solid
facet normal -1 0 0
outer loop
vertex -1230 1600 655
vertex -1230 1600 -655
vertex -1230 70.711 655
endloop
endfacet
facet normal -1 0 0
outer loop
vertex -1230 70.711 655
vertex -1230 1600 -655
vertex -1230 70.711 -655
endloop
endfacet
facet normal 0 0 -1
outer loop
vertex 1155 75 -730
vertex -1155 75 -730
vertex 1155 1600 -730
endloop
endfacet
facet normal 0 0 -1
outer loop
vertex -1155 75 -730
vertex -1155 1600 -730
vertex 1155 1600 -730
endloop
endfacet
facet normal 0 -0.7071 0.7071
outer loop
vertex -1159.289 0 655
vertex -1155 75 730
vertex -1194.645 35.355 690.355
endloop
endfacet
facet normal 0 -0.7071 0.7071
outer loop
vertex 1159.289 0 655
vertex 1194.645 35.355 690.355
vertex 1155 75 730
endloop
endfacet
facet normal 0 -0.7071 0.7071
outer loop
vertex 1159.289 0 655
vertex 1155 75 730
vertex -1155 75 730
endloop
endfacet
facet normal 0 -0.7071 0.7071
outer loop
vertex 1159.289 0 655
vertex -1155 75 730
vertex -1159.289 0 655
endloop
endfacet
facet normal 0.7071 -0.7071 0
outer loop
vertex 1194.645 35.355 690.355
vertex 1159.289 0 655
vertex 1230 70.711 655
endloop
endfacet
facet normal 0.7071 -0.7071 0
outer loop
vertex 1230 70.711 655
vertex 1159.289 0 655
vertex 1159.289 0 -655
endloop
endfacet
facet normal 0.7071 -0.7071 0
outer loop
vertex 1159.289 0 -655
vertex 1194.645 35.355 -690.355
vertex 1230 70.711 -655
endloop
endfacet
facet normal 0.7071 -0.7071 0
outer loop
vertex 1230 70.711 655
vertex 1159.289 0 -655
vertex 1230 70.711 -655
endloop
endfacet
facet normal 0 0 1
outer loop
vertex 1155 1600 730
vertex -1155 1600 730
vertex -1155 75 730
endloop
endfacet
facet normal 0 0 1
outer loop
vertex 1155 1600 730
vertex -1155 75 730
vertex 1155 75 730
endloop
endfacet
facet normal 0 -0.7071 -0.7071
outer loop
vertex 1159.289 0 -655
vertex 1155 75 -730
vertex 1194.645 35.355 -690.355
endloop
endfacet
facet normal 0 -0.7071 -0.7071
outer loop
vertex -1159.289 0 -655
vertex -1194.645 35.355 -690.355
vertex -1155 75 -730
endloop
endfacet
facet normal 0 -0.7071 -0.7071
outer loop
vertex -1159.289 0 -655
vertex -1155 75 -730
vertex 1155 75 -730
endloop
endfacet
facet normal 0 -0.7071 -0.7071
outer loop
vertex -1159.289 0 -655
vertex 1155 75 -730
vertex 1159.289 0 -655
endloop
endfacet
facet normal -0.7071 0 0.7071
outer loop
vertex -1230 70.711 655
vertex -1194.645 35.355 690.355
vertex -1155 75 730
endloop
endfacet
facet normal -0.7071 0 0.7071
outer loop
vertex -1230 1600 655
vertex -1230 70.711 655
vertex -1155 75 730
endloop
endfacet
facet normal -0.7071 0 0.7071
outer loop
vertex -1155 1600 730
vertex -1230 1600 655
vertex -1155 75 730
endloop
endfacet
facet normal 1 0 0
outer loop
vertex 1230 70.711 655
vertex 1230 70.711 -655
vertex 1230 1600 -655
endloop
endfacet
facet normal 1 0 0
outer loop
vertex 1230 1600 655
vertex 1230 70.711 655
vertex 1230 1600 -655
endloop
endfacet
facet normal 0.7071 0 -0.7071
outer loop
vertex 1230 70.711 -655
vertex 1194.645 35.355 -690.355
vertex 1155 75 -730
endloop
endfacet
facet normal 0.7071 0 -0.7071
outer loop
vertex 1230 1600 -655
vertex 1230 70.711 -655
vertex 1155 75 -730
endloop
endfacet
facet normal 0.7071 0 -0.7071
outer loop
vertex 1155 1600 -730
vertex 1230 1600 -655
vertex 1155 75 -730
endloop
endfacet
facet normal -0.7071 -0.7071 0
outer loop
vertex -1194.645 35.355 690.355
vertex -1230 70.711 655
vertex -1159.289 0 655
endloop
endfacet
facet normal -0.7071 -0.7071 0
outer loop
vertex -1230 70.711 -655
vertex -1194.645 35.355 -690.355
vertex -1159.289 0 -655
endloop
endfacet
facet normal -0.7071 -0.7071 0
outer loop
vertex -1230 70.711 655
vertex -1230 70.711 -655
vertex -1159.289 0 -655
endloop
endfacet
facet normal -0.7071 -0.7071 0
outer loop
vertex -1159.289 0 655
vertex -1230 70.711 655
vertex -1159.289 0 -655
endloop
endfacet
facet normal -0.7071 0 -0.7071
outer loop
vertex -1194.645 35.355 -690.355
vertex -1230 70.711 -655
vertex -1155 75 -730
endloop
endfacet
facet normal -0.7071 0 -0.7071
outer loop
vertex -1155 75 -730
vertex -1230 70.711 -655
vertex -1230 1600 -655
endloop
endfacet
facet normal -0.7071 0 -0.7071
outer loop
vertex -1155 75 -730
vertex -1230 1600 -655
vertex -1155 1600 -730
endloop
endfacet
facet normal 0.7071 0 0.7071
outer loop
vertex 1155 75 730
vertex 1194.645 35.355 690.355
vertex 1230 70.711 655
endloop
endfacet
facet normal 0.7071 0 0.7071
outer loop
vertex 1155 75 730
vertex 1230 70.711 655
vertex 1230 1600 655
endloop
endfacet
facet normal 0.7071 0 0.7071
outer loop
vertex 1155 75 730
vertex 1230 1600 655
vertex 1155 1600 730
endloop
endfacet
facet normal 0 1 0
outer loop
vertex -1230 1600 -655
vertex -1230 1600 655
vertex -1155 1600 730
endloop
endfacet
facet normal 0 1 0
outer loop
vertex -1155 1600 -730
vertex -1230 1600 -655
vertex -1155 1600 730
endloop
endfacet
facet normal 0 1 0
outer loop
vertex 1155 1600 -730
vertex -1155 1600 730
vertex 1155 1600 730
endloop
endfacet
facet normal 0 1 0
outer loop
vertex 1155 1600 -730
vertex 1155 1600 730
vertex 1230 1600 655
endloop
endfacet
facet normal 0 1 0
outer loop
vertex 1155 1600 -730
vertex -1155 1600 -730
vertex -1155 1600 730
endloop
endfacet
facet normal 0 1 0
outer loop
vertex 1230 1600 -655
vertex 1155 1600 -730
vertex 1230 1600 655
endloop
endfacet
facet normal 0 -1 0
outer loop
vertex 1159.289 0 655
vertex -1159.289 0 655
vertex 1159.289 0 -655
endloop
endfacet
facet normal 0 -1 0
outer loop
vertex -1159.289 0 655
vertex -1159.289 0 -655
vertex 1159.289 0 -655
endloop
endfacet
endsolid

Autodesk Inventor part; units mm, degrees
ref_plane "YZ Plane" through (0, 0, 0) normal (1, 0, 0) x (0, 1, 0)
ref_plane "XZ Plane" through (0, 0, 0) normal (0, 1, 0) x (-1, 0, 0)
ref_plane "XY Plane" through (0, 0, 0) normal (0, 0, 1) x (1, 0, 0)
sketch "Sketch18" plane through (0, 0, 0) normal (0, 0, 1) x (1, 0, 0)
  circle A0 centre (0, 1100) radius 213
  line L0 (0, 0) -> (0, 1100) construction
  line L1 (0, 1100) -> (0, 1600) construction
  line L2 (0, 1100) -> (-158.3548, 850) construction
  line L3 (-158.3548, 850) -> (-454.2876, 850) construction
  line L4 (-454.2876, 850) -> (-612.6424, 1100) construction
  line L5 (-612.6424, 1100) -> (0, 1100) construction
  line L6 (-1230, 1600) -> (1230, 1600)
  line L7 (1541.1151, -621.787) -> (-1872.5331, -621.787) construction
  line L8 (-1230, 1600) -> (-1230, 265.165)
  line L9 (-1230, 265.165) -> (-964.835, 0)
  line L10 (-964.835, 0) -> (1159.2893, 0)
  line L11 (1159.2893, 0) -> (1230, 70.7107)
  line L12 (1230, 70.7107) -> (1230, 1600)
  line L13 (-1468.3883, 141.4214) -> (-1468.3883, -183.5786)
  line L14 (-1468.3883, 198.9214) -> (-1496.3883, 198.9214)
  line L15 (-1496.3883, 198.9214) -> (-1496.3883, -241.0786)
  line L16 (-1496.3883, -241.0786) -> (-1468.3883, -241.0786)
  line L17 (-1468.3883, -241.0786) -> (-1468.3883, 198.9214)
  line L18 (-1097.4175, 132.5825) -> (-1251.0786, -21.0786) construction
  line L19 (-1251.0786, -21.0786) -> (-1468.3883, -21.0786) construction
  line L20 (-1468.3883, 141.4214) -> (-1318.3883, 141.4214)
  line L21 (-1318.3883, 141.4214) -> (-1212.3223, 247.4874)
  line L22 (-1468.3883, -183.5786) -> (-1183.7689, -183.5786)
  line L23 (-1183.7689, -183.5786) -> (-982.5126, 17.6777)
  line L24 (-1318.3883, 141.4214) -> (-1183.7689, -183.5786)
  line L25 (1313.2107, -113.2107) -> (1341.2107, -113.2107)
  line L26 (1341.2107, -113.2107) -> (1341.2107, -553.2107)
  line L27 (1341.2107, -553.2107) -> (1313.2107, -553.2107)
  line L28 (1313.2107, -553.2107) -> (1313.2107, -113.2107)
  line L29 (980, 0) -> (980, -135.3553) construction
  line L30 (980, -135.3553) -> (1177.8553, -333.2107) construction
  line L31 (1177.8553, -333.2107) -> (1313.2107, -333.2107) construction
  line L32 (1313.2107, -170.7107) -> (1213.2107, -170.7107)
  line L33 (1213.2107, -170.7107) -> (1142.5, -100)
  line L34 (1142.5, -100) -> (1142.5, 0)
  line L35 (1313.2107, -495.7107) -> (1142.5, -495.7107)
  line L36 (1142.5, -495.7107) -> (817.5, -170.7107)
  line L37 (817.5, -170.7107) -> (817.5, 0)
  line L38 (1142.5, -100) -> (817.5, -170.7107)
  line L39 (1213.2107, -170.7107) -> (1142.5, -495.7107)
  line L40 (1177.8553, -135.3553) -> (980, -333.2107) construction
  line L41 (1142.5, -50) -> (817.5, -50) construction
  line L42 (-764.544, 0) -> (-593.6658, 0)
  line L43 (28, 0) -> (23.8247, 0)
  line L44 (28, -50) -> (28, 0)
  line L45 (28, -50) -> (-28, -50)
  line L46 (-28, -50) -> (-28, -22)
  line L47 (-28, -22) -> (0, -22)
  line L48 (0, -22) -> (0, 0)
  line L49 (0, -22) -> (28, -22) construction
  line L50 (-33.8617, -50) -> (33.8617, -50)
  line L51 (33.8617, -50) -> (33.8617, -60)
  line L52 (33.8617, -60) -> (-33.8617, -60)
  line L53 (-33.8617, -60) -> (-33.8617, -50)
  line L54 (-37.5, -60) -> (37.5, -60)
  line L55 (37.5, -60) -> (37.5, -200)
  line L56 (37.5, -200) -> (-37.5, -200)
  line L57 (-37.5, -200) -> (-37.5, -60)
  line L58 (378, 0) -> (373.8247, 0)
  line L59 (350, -22) -> (350, 0)
  line L60 (322, -22) -> (350, -22)
  line L61 (350, -22) -> (378, -22) construction
  line L62 (322, -50) -> (322, -22)
  line L63 (378, -50) -> (378, 0)
  line L64 (378, -50) -> (322, -50)
  line L65 (387.5, -60) -> (387.5, -200)
  line L66 (383.8617, -50) -> (383.8617, -60)
  line L67 (312.5, -200) -> (312.5, -60)
  line L68 (387.5, -200) -> (312.5, -200)
  line L69 (316.1383, -50) -> (383.8617, -50)
  line L70 (383.8617, -60) -> (316.1383, -60)
  line L71 (312.5, -60) -> (387.5, -60)
  line L72 (316.1383, -60) -> (316.1383, -50)
  line L73 (-322, 0) -> (-326.1753, 0)
  line L74 (-350, -22) -> (-350, 0)
  line L75 (-378, -22) -> (-350, -22)
  line L76 (-350, -22) -> (-322, -22) construction
  line L77 (-378, -50) -> (-378, -22)
  line L78 (-322, -50) -> (-322, 0)
  line L79 (-322, -50) -> (-378, -50)
  line L80 (-312.5, -60) -> (-312.5, -200)
  line L81 (-316.1383, -50) -> (-316.1383, -60)
  line L82 (-387.5, -200) -> (-387.5, -60)
  line L83 (-312.5, -200) -> (-387.5, -200)
  line L84 (-383.8617, -50) -> (-316.1383, -50)
  line L85 (-316.1383, -60) -> (-383.8617, -60)
  line L86 (-387.5, -60) -> (-312.5, -60)
  line L87 (-383.8617, -60) -> (-383.8617, -50)
  line L88 (728, 0) -> (723.8247, 0)
  line L89 (700, -22) -> (700, 0)
  line L90 (672, -22) -> (700, -22)
  line L91 (700, -22) -> (728, -22) construction
  line L92 (672, -50) -> (672, -22)
  line L93 (728, -50) -> (728, 0)
  line L94 (728, -50) -> (672, -50)
  line L95 (737.5, -60) -> (737.5, -200)
  line L96 (733.8617, -50) -> (733.8617, -60)
  line L97 (662.5, -200) -> (662.5, -60)
  line L98 (737.5, -200) -> (662.5, -200)
  line L99 (666.1383, -50) -> (733.8617, -50)
  line L100 (733.8617, -60) -> (666.1383, -60)
  line L101 (662.5, -60) -> (737.5, -60)
  line L102 (666.1383, -60) -> (666.1383, -50)
  line L103 (-672, 0) -> (-676.1753, 0)
  line L104 (-700, -22) -> (-700, 0)
  line L105 (-728, -22) -> (-700, -22)
  line L106 (-700, -22) -> (-672, -22) construction
  line L107 (-728, -50) -> (-728, -22)
  line L108 (-672, -50) -> (-672, 0)
  line L109 (-672, -50) -> (-728, -50)
  line L110 (-662.5, -60) -> (-662.5, -200)
  line L111 (-666.1383, -50) -> (-666.1383, -60)
  line L112 (-737.5, -200) -> (-737.5, -60)
  line L113 (-662.5, -200) -> (-737.5, -200)
  line L114 (-733.8617, -50) -> (-666.1383, -50)
  line L115 (-666.1383, -60) -> (-733.8617, -60)
  line L116 (-737.5, -60) -> (-662.5, -60)
  line L117 (-733.8617, -60) -> (-733.8617, -50)
  line L118 (-1230, 265.165) -> (-1230, 70.7107)
  line L119 (-1230, 70.7107) -> (-1159.2893, 0)
  line L120 (-1159.2893, 0) -> (-964.835, 0)
  line L121 (1980.1647, -124.622) -> (1655.1647, -124.622)
  line L122 (1655.1647, -124.622) -> (1655.1647, -361.6901)
  line L123 (2165.0175, -309.4748) -> (2165.0175, -634.4748)
  line L124 (1980.1647, -124.622) -> (1980.1647, -309.4748)
  line L125 (1980.1647, -309.4748) -> (2165.0175, -309.4748)
  line L126 (2022.5911, -267.0484) -> (1791.5571, -498.0824)
  line L127 (1980.1647, -224.622) -> (2065.0175, -309.4748)
  line L128 (1655.1647, -361.6901) -> (1927.9494, -634.4748)
  line L129 (1980.1647, -224.622) -> (1655.1647, -361.6901)
  line L130 (2065.0175, -309.4748) -> (1927.9494, -634.4748)
  line L131 (2165.0175, -634.4748) -> (1927.9494, -634.4748)
  point P0 (-306.3212, 850)
  point P1 (-306.3212, 1100)
  point P2 (0, -50)
  point P3 (0, -60)
  point P4 (350, 0)
  point P5 (350, -50)
  point P6 (350, -60)
  point P7 (-350, 0)
  point P8 (-350, -50)
  point P9 (-350, -60)
  point P10 (700, 0)
  point P11 (700, -50)
  point P12 (700, -60)
  point P13 (-700, 0)
  point P14 (-700, -50)
  point P15 (-700, -60)
  dimension "d112" = 426
  dimension "d113" = 1100
  dimension "d114" = 500
  dimension "d115" = 1100
  dimension "d116" = 250
  dimension "d120" = 2460
  dimension "d121" = 325
  dimension "d123" = 28
  dimension "d124" = 440
  dimension "d125" = 135
  dimension "d127" = 67.5
  dimension "d128" = 100
  dimension "d129" = 375
  dimension "d130" = 1600
  dimension "d131" = 150
  dimension "d132" = 250
  dimension "d133" = 100
  dimension "d135" = 50
  dimension "d136" = -28
  dimension "d137" = 10
  dimension "d138" = 140
  dimension "d139" = 75
  dimension "d142" = 350
  dimension "d157" = 217.3097
  dimension "d164" = 135.3553
  dimension "d165" = 279.8097
  dimension "d174" = 12.275
  dimension "d175" = 32.725
  dimension "d176" = 459.6194
  dimension "d177" = 279.8097
  dimension "d178" = 325
  dimension "d179" = 45
  dimension "d180" = 100
  dimension "d181" = 100
  dimension "d182" = 120
  dimension "d184" = 326.7315
  dimension "d185" = 22.867
  dimension "d186" = 22.133
extrude "Extrusion16" add sketch "Sketch18" along normal mid plane 1460 contours A0 | L6 L12 L11 L10 L9 L8 | L9 L21 L118 | L9 L23 L120 L119 L118 L21 | L9 L120 L23
sketch "Sketch19" plane through (-1230, 265.165, 700) normal (-1, 0, 0) x (0, 0, 1)
  circle A0 centre (-700, 834.835) radius 213
  line L0 (30, 1334.835) -> (30, -194.4544) construction
  line L1 (-1430, 1334.835) -> (30, 1334.835) construction
  line L2 (-1430, -194.4544) -> (-1430, 1334.835) construction
  line L3 (-1430, 1334.835) -> (30, 1334.835) projected
  line L4 (-1430, -194.4544) -> (30, -194.4544) projected
  point P0 (-700, -265.165)
  point P1 (-700, 1334.835)
  point P2 (-700, 1334.835)
  dimension "d149" = 500
  dimension "d150" = 426
extrude "Extrusion17" [suppressed]
sketch "Sketch20" plane through (0, 0, -730) normal (0, 0, -1) x (-1, 0, 0)
  circle A0 centre (0, 1100) radius 213
  line L0 (1230, 1600) -> (-1230, 1600) projected
  point P0 (0, 0)
  point P1 (0, 1600)
  point P2 (0, 1600)
  dimension "d153" = 500
  dimension "d154" = 426
extrude "Extrusion18" [suppressed]
sketch "Sketch23" plane through (0, 0, 0) normal (0, 0, 1) x (1, 0, 0)
  line L0 (1159.2893, 0) -> (1230, 70.7107) construction
  line L1 (1230, 70.7107) -> (1230, 1600) construction
  line L2 (1230, 1600) -> (-1230, 1600) construction
  line L3 (-1230, 1600) -> (-1230, 70.7107) construction
  line L4 (980, 0) -> (980, -135.3553)
  line L5 (980, -135.3553) -> (1177.8553, -333.2107)
  line L6 (1177.8553, -333.2107) -> (1313.2107, -333.2107)
  line L7 (-1159.2893, 0) -> (1159.2893, 0) projected
  line L8 (-1230, 70.7107) -> (-1159.2893, 0) projected
  point P0 (0, 0)
  dimension "d162" = 135
  dimension "d163" = 250
  dimension "d166" = 135.3553
  dimension "d167" = 279.8097
sketch "Sketch24" plane through (-1034.835, 0, 700) normal (0, -1, 0) x (1, 0, 0)
  circle A0 centre (2084.835, -700) radius 162.5
  point P0 (1034.835, -700)
  dimension "d168" = 325
sweep "Sweep4" [suppressed]
mirror "Mirror7" [suppressed]
mirror "Mirror8" [suppressed]
chamfer "Chamfer2" distance 75 angle 45 6 edges at (-1230, 835.3553, 730) (0, 0, 730) (1230, 835.3553, 730) (1230, 835.3553, -730) (0, 0, -730) (-1230, 835.3553, -730)
properties part number "GBK-RK-0005 RK dummy 5" material "Water"
